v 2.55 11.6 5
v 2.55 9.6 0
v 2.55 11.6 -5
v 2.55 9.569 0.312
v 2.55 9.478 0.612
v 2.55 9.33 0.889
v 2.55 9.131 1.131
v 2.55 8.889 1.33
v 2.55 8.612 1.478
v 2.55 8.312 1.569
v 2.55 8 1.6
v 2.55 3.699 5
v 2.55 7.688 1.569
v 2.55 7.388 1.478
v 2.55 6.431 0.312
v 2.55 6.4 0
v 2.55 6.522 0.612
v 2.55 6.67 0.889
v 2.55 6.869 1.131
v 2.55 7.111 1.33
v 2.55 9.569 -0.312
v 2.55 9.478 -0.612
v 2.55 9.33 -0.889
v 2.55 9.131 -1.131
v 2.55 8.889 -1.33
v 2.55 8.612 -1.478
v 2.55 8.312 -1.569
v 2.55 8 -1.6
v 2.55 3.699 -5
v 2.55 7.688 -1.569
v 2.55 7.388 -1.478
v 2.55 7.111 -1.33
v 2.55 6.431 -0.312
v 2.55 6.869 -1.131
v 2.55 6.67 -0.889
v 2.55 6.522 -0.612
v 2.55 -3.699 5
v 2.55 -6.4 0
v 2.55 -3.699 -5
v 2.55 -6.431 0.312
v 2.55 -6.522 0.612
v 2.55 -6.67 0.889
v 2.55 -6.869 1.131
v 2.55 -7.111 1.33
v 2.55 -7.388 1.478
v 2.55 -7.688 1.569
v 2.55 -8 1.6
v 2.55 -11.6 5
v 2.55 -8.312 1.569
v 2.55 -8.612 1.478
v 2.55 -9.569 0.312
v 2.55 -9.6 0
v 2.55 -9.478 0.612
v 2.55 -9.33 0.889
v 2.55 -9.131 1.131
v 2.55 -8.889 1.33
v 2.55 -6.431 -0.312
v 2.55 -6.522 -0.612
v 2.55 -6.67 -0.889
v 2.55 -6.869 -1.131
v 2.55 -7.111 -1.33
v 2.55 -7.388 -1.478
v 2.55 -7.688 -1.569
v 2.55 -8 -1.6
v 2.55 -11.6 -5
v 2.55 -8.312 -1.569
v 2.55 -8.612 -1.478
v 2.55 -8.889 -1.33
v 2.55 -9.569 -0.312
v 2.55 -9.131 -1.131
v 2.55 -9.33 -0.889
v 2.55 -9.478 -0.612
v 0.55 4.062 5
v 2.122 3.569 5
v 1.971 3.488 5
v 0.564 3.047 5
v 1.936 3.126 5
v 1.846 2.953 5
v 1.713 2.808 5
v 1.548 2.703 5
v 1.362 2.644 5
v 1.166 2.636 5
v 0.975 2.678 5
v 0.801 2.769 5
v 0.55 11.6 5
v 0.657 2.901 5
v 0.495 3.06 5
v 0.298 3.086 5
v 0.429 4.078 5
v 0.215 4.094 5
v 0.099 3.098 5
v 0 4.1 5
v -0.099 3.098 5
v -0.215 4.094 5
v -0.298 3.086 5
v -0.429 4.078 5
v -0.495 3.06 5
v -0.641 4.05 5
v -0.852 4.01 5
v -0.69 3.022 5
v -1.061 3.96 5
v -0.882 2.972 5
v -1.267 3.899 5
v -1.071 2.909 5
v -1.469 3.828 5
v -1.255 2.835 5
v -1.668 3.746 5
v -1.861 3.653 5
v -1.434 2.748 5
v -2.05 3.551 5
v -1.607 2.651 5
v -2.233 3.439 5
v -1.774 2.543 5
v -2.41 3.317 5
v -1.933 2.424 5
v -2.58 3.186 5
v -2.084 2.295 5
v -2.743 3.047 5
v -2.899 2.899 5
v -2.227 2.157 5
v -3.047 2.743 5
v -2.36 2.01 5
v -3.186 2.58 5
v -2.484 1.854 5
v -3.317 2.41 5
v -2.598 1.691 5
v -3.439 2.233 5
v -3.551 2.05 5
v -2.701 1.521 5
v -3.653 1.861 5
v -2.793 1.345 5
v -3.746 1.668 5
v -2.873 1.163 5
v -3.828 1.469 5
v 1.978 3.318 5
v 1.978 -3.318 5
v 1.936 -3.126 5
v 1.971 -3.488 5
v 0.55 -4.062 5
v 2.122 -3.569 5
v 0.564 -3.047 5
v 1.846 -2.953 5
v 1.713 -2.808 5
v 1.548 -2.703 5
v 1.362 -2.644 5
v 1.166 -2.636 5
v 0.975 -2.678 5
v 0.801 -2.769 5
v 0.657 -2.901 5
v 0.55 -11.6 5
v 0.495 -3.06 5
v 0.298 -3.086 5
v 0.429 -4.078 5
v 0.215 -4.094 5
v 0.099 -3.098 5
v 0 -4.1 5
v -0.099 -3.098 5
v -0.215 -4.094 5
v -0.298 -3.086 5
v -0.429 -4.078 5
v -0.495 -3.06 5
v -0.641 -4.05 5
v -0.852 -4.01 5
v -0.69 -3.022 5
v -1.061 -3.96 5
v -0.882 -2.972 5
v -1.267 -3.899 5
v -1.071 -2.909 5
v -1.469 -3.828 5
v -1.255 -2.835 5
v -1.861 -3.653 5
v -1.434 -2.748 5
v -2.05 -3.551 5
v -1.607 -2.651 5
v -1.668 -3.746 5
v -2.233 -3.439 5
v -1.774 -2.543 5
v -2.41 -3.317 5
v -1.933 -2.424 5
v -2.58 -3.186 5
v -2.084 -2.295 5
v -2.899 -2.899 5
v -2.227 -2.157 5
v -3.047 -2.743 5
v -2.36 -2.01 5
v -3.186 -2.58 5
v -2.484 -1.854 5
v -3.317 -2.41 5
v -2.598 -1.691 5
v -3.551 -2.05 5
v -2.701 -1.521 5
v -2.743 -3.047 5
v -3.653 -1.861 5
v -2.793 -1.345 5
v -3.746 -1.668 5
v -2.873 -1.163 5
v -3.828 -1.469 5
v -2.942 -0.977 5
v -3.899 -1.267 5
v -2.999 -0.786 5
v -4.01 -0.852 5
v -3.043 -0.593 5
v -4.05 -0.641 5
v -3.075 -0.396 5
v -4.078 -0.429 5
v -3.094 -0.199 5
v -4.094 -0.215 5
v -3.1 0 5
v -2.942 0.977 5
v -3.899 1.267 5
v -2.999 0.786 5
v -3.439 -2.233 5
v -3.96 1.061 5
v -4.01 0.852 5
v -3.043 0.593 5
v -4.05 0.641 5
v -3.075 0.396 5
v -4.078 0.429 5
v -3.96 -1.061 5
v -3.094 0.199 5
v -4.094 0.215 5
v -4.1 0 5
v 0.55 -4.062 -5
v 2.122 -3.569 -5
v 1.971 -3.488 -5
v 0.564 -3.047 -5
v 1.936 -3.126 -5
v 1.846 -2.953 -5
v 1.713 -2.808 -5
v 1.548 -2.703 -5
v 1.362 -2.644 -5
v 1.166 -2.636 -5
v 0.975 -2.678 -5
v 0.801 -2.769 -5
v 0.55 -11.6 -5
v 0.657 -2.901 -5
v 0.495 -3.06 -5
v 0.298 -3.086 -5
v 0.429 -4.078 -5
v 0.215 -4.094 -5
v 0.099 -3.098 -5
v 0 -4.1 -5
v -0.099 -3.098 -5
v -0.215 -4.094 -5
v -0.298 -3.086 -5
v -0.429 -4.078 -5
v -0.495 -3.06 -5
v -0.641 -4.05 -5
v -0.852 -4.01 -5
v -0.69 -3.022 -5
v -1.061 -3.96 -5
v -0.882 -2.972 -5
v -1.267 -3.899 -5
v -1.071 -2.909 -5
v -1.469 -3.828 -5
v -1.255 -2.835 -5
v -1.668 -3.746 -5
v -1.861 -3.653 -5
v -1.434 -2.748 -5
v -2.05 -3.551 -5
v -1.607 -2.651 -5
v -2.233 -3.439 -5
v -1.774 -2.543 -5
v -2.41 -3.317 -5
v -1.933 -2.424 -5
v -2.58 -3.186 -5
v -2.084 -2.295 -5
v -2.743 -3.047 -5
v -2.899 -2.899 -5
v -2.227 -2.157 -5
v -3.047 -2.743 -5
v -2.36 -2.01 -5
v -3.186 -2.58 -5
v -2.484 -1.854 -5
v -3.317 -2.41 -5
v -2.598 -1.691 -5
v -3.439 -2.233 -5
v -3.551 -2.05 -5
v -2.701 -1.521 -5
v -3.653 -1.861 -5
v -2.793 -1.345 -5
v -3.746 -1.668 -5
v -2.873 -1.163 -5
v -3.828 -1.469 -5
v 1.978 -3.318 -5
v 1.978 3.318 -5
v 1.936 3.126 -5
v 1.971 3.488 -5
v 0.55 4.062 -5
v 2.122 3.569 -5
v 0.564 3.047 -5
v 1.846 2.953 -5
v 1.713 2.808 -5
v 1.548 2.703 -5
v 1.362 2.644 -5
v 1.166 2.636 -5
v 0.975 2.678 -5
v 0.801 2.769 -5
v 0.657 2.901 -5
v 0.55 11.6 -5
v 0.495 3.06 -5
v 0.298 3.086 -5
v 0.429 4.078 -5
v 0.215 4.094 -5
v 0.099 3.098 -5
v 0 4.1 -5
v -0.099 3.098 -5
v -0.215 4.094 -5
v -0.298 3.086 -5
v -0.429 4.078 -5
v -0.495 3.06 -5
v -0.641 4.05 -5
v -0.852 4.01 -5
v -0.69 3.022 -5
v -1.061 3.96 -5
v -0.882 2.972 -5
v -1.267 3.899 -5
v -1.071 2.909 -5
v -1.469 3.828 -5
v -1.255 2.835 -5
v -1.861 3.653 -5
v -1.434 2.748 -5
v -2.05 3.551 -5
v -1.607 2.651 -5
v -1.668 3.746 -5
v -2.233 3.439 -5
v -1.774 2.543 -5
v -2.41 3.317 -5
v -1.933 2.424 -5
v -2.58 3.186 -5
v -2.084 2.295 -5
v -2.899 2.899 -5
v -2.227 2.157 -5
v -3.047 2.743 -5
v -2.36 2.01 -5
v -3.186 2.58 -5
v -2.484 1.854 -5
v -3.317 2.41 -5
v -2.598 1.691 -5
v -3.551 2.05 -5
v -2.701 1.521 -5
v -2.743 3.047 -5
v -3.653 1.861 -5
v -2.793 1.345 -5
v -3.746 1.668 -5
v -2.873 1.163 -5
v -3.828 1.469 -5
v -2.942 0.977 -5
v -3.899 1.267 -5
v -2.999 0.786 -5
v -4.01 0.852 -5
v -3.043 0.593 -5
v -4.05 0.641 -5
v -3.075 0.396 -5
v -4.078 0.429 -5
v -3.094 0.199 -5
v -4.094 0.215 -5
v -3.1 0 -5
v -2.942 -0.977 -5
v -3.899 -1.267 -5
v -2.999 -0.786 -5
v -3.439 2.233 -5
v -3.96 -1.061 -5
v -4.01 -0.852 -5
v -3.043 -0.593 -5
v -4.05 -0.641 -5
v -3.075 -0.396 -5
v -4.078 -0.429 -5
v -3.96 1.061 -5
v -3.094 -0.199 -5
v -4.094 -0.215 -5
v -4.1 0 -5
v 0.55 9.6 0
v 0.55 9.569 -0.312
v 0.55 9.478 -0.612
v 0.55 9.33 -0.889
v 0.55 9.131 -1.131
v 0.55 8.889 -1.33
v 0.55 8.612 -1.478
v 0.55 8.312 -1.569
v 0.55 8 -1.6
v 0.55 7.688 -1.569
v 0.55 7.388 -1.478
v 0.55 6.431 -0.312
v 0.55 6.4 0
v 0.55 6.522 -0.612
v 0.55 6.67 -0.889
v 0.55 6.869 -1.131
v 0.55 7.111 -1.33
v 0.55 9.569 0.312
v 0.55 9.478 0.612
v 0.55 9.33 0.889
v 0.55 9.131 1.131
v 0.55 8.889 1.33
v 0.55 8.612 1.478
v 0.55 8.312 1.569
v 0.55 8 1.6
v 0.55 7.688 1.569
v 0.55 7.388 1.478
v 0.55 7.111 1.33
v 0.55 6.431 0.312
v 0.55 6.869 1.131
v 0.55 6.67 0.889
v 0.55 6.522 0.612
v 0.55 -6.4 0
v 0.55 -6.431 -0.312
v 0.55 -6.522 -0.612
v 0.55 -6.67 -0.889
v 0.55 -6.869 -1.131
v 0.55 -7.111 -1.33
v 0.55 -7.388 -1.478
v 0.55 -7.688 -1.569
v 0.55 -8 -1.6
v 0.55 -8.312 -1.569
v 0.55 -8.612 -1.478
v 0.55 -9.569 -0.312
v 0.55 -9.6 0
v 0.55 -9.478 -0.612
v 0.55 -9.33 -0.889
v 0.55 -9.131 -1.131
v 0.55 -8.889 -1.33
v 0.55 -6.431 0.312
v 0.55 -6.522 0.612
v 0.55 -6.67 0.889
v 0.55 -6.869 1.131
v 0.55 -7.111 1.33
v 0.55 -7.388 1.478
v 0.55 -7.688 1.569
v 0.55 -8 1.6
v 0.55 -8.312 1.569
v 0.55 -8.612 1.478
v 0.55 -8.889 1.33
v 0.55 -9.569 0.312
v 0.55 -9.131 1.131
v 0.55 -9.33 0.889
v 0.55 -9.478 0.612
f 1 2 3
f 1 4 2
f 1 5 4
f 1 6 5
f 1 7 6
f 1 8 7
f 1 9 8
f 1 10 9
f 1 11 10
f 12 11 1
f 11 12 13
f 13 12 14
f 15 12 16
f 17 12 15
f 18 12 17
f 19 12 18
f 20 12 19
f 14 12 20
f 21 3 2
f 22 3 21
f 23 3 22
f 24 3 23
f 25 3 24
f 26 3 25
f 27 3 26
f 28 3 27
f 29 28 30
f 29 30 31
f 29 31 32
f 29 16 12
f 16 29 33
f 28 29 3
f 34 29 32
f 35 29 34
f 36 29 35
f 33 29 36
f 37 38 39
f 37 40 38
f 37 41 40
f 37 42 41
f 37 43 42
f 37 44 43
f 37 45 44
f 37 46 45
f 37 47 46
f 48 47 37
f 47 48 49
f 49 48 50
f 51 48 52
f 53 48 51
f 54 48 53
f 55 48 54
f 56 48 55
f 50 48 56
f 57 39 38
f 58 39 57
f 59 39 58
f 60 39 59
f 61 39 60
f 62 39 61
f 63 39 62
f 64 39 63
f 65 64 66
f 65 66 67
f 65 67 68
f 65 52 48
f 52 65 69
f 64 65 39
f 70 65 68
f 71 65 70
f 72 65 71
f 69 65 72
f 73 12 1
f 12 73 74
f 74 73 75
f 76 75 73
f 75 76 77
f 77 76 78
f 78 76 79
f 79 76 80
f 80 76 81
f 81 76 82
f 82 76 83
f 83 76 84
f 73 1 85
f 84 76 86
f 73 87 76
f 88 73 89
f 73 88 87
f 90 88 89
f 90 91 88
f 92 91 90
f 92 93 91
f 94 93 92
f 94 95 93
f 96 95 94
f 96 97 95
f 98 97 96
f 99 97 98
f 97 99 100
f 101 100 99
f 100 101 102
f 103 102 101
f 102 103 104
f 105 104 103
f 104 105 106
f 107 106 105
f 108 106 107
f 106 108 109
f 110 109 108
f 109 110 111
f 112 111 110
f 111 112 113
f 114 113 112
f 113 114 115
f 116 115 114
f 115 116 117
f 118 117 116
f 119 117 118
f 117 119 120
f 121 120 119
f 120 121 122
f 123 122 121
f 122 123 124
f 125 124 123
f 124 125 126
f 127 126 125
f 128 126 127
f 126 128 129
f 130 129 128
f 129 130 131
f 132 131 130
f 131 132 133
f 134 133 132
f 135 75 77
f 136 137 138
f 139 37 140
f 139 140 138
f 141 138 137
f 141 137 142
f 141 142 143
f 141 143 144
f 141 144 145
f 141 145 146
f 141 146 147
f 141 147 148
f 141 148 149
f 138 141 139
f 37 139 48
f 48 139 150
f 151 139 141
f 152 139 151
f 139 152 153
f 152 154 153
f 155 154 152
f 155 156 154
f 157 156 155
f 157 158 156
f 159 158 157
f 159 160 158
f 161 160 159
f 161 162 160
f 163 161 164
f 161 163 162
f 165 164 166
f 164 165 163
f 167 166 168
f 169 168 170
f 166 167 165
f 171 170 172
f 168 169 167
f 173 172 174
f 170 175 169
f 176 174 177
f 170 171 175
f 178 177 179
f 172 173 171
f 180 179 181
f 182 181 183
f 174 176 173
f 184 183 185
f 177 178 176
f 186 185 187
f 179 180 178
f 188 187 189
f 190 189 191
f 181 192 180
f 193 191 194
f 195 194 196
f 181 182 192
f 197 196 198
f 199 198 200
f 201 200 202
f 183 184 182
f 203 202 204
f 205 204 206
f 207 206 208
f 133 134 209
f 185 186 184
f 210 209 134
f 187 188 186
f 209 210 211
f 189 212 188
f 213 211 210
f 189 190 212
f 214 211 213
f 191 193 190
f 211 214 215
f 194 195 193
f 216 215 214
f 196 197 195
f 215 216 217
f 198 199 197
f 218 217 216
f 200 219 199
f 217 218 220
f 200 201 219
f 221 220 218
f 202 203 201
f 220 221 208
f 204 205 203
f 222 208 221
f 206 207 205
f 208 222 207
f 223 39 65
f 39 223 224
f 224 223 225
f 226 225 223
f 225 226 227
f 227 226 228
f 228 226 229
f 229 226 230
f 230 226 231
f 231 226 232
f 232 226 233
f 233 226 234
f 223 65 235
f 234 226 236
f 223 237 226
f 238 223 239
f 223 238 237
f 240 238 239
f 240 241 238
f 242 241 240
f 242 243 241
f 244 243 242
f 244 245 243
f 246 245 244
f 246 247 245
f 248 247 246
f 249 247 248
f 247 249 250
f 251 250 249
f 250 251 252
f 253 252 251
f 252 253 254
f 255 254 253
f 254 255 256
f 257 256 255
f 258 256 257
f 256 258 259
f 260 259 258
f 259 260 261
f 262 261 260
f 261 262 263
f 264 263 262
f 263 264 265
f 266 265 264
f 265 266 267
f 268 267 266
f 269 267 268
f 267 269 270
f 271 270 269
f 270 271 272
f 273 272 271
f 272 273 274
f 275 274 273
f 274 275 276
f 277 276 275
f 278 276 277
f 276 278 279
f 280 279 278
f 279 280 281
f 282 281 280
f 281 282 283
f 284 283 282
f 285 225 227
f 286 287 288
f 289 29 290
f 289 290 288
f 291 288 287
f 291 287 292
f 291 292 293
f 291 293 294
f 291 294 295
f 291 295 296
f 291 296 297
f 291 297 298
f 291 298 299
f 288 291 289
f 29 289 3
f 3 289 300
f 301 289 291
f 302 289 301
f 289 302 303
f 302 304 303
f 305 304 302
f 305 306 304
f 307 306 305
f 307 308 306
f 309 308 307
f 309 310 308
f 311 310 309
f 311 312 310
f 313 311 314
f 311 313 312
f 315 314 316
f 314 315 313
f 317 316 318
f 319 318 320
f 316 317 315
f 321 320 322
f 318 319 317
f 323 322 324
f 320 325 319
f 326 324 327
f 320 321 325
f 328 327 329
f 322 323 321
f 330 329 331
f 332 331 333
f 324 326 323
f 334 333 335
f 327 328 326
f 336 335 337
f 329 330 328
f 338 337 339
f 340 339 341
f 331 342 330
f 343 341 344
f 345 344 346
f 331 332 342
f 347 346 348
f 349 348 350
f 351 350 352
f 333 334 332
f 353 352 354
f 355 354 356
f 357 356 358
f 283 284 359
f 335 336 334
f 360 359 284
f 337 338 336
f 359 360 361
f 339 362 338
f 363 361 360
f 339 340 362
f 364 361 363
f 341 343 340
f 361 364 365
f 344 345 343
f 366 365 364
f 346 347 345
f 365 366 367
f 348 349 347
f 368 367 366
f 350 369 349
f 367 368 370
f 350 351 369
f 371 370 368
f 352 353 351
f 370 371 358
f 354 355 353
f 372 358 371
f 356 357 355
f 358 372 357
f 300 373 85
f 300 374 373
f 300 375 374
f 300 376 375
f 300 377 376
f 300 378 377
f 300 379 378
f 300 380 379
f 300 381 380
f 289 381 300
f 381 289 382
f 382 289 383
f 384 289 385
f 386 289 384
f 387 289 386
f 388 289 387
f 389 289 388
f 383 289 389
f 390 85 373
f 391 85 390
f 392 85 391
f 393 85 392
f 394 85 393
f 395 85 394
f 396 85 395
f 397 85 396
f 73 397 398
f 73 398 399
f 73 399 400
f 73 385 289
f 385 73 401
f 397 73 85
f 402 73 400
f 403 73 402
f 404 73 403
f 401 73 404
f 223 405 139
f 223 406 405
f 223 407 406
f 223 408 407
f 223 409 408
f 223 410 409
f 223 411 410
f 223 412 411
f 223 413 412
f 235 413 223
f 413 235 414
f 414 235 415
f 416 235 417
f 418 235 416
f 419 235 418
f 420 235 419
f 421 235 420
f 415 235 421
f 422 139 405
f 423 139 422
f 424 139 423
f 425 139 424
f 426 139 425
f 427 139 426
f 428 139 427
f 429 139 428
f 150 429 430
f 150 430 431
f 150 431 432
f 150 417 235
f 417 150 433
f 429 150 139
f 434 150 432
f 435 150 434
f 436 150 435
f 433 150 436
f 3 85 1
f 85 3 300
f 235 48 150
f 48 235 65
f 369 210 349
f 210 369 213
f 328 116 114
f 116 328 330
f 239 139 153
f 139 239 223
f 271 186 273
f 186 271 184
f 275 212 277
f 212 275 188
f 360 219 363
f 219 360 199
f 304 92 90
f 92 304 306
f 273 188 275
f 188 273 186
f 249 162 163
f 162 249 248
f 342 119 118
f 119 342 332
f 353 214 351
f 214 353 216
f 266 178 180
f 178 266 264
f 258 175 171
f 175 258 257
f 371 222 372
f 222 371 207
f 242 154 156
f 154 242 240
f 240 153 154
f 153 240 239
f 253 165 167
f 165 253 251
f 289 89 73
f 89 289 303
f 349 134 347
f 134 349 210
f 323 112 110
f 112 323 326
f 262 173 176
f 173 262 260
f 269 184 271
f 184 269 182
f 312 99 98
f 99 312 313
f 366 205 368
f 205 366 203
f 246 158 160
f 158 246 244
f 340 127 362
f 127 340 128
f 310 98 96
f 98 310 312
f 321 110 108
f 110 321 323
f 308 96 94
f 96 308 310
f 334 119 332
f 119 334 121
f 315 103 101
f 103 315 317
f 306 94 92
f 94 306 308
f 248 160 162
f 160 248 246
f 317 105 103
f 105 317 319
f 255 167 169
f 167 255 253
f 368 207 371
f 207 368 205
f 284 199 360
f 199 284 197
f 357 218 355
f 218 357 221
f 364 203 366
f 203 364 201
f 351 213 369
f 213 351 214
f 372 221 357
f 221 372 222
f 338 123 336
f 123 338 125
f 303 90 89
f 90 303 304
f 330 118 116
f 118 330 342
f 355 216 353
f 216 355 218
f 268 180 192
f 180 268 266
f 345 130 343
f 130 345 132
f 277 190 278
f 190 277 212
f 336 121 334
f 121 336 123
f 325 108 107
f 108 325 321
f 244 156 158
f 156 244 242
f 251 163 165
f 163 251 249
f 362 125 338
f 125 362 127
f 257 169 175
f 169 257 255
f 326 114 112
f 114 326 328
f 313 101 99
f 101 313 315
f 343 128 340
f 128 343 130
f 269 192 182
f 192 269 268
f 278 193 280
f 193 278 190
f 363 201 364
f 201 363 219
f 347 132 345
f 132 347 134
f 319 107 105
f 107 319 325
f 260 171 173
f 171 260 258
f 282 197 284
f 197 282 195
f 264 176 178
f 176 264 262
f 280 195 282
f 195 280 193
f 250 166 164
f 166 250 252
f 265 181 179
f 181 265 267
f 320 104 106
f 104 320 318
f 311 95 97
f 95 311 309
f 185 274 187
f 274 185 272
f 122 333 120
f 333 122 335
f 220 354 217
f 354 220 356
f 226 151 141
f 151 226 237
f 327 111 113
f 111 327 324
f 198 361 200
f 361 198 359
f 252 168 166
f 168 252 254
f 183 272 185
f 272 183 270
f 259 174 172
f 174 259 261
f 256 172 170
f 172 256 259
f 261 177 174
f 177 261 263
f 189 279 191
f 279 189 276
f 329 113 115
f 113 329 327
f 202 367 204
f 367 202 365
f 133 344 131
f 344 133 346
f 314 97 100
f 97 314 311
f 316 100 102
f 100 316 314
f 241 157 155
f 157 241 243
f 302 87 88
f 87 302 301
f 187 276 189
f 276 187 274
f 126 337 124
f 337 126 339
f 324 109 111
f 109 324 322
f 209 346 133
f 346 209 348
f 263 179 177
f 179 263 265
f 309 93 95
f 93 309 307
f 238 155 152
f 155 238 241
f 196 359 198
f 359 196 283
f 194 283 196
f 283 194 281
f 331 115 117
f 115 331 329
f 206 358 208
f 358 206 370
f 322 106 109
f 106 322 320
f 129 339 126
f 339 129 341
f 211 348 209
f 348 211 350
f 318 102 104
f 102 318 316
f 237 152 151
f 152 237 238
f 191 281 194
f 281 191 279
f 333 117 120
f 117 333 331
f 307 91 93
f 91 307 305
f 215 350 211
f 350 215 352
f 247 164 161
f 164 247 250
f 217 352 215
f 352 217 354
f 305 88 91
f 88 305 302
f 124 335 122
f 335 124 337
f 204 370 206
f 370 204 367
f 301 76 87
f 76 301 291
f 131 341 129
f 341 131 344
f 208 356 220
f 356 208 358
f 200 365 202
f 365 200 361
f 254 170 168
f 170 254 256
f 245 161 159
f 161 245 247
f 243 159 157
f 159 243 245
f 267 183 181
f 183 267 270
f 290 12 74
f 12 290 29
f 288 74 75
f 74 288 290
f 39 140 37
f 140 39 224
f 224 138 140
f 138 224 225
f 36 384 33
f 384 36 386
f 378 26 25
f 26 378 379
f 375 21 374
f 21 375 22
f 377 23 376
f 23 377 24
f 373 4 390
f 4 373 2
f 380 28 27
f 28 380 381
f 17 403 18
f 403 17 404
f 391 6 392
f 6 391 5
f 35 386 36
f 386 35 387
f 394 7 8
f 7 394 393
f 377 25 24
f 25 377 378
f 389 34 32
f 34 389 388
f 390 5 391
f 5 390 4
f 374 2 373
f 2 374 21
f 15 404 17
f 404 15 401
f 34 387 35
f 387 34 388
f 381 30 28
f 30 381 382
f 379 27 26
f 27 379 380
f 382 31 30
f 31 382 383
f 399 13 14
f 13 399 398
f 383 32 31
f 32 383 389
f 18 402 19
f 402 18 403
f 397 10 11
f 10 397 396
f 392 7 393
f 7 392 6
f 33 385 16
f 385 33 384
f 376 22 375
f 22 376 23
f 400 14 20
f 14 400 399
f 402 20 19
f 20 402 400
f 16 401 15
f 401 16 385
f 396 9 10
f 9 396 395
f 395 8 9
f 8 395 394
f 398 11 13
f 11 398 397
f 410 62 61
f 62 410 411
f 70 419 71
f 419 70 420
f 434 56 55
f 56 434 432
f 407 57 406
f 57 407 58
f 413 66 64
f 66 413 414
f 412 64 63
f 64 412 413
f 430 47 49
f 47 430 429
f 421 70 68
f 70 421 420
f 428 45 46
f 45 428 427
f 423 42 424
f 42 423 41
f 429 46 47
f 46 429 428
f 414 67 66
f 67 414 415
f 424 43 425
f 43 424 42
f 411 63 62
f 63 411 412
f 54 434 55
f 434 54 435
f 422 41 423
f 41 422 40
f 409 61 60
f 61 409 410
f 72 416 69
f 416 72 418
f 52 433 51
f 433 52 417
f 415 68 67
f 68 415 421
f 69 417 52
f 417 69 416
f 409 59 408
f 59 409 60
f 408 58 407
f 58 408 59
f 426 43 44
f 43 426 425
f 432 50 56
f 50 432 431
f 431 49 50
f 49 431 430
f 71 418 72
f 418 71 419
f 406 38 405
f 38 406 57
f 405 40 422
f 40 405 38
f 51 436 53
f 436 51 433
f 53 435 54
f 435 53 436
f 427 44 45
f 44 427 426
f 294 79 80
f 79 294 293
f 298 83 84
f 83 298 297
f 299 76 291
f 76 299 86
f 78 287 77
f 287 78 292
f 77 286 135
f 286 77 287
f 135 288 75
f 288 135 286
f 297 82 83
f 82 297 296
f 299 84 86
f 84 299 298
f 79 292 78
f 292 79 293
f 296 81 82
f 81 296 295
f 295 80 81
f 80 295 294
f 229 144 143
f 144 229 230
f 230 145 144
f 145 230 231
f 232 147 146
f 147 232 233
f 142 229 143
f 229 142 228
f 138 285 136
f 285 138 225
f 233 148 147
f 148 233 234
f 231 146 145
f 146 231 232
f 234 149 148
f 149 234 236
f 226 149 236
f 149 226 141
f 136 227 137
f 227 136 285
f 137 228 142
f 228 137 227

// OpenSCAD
// Rod clamp  Mark "Ckaos" Moissette
//It is licensed under the Creative Commons - GNU GPL license.
// © 2011 by Mark "Ckaos" Moissette
///////////////////////////////
//example usage
clamp(two_arms=true);

///////////////////////////////
// USER PARAMETERS
///////////////////////////////
$fs=0.2; // def 1, 0.2 is high res
$fa=3;//def 12, 3 is very nice

rod_dia=6.2;

clamp_height=10;
clamp_thickness=1.0;
clamp_opening_angle=140;
end_round_dia=1.5;//diameter of the rounded elements at the edges of the clamp

mount_hole_dia=3.2;
mount_hole_distance=8;//in relation to the center of the rod it will be mounted on
mount_hole_border_thickness=2.0;

arm_thickness=2;

// //////////////////////////////
// OpenSCAD SCRIPT
// //////////////////////////////

 module clamp(two_arms=false)//the actual clamp module
{
	centerRadius=(rod_dia+clamp_thickness)/2;	
	opening_dia=(sin(clamp_opening_angle/2)*rod_dia/2+end_round_dia/2+0.2)*2;
	
	side_block_lng=mount_hole_distance+mount_hole_border_thickness+mount_hole_dia/2;
	echo(side_block_lng*2);
	side_block_offset=(-arm_thickness+rod_dia)/2+clamp_thickness;
	difference()
	{
		union()
		{
			//side blocks
			translate([side_block_offset/2,side_block_lng/2,0]) cube([arm_thickness,side_block_lng,clamp_height],center=true);
			if(two_arms)
			{
			translate([side_block_offset/2,-side_block_lng/2,0]) cube([arm_thickness,side_block_lng,clamp_height],center=true);
			}

			//clamp outer cylinder
			translate([0,0,0]) cylinder(r=rod_dia/2+clamp_thickness,h=clamp_height,center=true);
		}
		union()
		{
			//clamp center hole
			translate([0,0,0]) cylinder(r=rod_dia/2,h=clamp_height+0.1,center=true);
			//clamp opening
			translate([centerRadius,0,0]) cylinder(r=opening_dia/2,h=clamp_height+0.1,center=true,$fn=32);
			//mount holes 
			translate([0,mount_hole_distance,0]) rotate([0,90,0]) cylinder(r=mount_hole_dia/2,h=clamp_height*2+0.1,center=true,$fn=32);
			translate([0,-mount_hole_distance,0]) rotate([0,90,0]) cylinder(r=mount_hole_dia/2,h=clamp_height*2+0.1,center=true,$fn=32);
		}
	}
	
	//clamp opening roundings
	 translate([0,0,0])  clamp_rounding(clamp_opening_angle/2,centerRadius);
	 translate([0,0,0]) clamp_rounding(-clamp_opening_angle/2,centerRadius);
}

module clamp_rounding(angle,distance)
{
	rotate([0,0,angle])
	translate([distance,0,0]) 
	cylinder(r=end_round_dia/2,h=clamp_height,center=true);
}
